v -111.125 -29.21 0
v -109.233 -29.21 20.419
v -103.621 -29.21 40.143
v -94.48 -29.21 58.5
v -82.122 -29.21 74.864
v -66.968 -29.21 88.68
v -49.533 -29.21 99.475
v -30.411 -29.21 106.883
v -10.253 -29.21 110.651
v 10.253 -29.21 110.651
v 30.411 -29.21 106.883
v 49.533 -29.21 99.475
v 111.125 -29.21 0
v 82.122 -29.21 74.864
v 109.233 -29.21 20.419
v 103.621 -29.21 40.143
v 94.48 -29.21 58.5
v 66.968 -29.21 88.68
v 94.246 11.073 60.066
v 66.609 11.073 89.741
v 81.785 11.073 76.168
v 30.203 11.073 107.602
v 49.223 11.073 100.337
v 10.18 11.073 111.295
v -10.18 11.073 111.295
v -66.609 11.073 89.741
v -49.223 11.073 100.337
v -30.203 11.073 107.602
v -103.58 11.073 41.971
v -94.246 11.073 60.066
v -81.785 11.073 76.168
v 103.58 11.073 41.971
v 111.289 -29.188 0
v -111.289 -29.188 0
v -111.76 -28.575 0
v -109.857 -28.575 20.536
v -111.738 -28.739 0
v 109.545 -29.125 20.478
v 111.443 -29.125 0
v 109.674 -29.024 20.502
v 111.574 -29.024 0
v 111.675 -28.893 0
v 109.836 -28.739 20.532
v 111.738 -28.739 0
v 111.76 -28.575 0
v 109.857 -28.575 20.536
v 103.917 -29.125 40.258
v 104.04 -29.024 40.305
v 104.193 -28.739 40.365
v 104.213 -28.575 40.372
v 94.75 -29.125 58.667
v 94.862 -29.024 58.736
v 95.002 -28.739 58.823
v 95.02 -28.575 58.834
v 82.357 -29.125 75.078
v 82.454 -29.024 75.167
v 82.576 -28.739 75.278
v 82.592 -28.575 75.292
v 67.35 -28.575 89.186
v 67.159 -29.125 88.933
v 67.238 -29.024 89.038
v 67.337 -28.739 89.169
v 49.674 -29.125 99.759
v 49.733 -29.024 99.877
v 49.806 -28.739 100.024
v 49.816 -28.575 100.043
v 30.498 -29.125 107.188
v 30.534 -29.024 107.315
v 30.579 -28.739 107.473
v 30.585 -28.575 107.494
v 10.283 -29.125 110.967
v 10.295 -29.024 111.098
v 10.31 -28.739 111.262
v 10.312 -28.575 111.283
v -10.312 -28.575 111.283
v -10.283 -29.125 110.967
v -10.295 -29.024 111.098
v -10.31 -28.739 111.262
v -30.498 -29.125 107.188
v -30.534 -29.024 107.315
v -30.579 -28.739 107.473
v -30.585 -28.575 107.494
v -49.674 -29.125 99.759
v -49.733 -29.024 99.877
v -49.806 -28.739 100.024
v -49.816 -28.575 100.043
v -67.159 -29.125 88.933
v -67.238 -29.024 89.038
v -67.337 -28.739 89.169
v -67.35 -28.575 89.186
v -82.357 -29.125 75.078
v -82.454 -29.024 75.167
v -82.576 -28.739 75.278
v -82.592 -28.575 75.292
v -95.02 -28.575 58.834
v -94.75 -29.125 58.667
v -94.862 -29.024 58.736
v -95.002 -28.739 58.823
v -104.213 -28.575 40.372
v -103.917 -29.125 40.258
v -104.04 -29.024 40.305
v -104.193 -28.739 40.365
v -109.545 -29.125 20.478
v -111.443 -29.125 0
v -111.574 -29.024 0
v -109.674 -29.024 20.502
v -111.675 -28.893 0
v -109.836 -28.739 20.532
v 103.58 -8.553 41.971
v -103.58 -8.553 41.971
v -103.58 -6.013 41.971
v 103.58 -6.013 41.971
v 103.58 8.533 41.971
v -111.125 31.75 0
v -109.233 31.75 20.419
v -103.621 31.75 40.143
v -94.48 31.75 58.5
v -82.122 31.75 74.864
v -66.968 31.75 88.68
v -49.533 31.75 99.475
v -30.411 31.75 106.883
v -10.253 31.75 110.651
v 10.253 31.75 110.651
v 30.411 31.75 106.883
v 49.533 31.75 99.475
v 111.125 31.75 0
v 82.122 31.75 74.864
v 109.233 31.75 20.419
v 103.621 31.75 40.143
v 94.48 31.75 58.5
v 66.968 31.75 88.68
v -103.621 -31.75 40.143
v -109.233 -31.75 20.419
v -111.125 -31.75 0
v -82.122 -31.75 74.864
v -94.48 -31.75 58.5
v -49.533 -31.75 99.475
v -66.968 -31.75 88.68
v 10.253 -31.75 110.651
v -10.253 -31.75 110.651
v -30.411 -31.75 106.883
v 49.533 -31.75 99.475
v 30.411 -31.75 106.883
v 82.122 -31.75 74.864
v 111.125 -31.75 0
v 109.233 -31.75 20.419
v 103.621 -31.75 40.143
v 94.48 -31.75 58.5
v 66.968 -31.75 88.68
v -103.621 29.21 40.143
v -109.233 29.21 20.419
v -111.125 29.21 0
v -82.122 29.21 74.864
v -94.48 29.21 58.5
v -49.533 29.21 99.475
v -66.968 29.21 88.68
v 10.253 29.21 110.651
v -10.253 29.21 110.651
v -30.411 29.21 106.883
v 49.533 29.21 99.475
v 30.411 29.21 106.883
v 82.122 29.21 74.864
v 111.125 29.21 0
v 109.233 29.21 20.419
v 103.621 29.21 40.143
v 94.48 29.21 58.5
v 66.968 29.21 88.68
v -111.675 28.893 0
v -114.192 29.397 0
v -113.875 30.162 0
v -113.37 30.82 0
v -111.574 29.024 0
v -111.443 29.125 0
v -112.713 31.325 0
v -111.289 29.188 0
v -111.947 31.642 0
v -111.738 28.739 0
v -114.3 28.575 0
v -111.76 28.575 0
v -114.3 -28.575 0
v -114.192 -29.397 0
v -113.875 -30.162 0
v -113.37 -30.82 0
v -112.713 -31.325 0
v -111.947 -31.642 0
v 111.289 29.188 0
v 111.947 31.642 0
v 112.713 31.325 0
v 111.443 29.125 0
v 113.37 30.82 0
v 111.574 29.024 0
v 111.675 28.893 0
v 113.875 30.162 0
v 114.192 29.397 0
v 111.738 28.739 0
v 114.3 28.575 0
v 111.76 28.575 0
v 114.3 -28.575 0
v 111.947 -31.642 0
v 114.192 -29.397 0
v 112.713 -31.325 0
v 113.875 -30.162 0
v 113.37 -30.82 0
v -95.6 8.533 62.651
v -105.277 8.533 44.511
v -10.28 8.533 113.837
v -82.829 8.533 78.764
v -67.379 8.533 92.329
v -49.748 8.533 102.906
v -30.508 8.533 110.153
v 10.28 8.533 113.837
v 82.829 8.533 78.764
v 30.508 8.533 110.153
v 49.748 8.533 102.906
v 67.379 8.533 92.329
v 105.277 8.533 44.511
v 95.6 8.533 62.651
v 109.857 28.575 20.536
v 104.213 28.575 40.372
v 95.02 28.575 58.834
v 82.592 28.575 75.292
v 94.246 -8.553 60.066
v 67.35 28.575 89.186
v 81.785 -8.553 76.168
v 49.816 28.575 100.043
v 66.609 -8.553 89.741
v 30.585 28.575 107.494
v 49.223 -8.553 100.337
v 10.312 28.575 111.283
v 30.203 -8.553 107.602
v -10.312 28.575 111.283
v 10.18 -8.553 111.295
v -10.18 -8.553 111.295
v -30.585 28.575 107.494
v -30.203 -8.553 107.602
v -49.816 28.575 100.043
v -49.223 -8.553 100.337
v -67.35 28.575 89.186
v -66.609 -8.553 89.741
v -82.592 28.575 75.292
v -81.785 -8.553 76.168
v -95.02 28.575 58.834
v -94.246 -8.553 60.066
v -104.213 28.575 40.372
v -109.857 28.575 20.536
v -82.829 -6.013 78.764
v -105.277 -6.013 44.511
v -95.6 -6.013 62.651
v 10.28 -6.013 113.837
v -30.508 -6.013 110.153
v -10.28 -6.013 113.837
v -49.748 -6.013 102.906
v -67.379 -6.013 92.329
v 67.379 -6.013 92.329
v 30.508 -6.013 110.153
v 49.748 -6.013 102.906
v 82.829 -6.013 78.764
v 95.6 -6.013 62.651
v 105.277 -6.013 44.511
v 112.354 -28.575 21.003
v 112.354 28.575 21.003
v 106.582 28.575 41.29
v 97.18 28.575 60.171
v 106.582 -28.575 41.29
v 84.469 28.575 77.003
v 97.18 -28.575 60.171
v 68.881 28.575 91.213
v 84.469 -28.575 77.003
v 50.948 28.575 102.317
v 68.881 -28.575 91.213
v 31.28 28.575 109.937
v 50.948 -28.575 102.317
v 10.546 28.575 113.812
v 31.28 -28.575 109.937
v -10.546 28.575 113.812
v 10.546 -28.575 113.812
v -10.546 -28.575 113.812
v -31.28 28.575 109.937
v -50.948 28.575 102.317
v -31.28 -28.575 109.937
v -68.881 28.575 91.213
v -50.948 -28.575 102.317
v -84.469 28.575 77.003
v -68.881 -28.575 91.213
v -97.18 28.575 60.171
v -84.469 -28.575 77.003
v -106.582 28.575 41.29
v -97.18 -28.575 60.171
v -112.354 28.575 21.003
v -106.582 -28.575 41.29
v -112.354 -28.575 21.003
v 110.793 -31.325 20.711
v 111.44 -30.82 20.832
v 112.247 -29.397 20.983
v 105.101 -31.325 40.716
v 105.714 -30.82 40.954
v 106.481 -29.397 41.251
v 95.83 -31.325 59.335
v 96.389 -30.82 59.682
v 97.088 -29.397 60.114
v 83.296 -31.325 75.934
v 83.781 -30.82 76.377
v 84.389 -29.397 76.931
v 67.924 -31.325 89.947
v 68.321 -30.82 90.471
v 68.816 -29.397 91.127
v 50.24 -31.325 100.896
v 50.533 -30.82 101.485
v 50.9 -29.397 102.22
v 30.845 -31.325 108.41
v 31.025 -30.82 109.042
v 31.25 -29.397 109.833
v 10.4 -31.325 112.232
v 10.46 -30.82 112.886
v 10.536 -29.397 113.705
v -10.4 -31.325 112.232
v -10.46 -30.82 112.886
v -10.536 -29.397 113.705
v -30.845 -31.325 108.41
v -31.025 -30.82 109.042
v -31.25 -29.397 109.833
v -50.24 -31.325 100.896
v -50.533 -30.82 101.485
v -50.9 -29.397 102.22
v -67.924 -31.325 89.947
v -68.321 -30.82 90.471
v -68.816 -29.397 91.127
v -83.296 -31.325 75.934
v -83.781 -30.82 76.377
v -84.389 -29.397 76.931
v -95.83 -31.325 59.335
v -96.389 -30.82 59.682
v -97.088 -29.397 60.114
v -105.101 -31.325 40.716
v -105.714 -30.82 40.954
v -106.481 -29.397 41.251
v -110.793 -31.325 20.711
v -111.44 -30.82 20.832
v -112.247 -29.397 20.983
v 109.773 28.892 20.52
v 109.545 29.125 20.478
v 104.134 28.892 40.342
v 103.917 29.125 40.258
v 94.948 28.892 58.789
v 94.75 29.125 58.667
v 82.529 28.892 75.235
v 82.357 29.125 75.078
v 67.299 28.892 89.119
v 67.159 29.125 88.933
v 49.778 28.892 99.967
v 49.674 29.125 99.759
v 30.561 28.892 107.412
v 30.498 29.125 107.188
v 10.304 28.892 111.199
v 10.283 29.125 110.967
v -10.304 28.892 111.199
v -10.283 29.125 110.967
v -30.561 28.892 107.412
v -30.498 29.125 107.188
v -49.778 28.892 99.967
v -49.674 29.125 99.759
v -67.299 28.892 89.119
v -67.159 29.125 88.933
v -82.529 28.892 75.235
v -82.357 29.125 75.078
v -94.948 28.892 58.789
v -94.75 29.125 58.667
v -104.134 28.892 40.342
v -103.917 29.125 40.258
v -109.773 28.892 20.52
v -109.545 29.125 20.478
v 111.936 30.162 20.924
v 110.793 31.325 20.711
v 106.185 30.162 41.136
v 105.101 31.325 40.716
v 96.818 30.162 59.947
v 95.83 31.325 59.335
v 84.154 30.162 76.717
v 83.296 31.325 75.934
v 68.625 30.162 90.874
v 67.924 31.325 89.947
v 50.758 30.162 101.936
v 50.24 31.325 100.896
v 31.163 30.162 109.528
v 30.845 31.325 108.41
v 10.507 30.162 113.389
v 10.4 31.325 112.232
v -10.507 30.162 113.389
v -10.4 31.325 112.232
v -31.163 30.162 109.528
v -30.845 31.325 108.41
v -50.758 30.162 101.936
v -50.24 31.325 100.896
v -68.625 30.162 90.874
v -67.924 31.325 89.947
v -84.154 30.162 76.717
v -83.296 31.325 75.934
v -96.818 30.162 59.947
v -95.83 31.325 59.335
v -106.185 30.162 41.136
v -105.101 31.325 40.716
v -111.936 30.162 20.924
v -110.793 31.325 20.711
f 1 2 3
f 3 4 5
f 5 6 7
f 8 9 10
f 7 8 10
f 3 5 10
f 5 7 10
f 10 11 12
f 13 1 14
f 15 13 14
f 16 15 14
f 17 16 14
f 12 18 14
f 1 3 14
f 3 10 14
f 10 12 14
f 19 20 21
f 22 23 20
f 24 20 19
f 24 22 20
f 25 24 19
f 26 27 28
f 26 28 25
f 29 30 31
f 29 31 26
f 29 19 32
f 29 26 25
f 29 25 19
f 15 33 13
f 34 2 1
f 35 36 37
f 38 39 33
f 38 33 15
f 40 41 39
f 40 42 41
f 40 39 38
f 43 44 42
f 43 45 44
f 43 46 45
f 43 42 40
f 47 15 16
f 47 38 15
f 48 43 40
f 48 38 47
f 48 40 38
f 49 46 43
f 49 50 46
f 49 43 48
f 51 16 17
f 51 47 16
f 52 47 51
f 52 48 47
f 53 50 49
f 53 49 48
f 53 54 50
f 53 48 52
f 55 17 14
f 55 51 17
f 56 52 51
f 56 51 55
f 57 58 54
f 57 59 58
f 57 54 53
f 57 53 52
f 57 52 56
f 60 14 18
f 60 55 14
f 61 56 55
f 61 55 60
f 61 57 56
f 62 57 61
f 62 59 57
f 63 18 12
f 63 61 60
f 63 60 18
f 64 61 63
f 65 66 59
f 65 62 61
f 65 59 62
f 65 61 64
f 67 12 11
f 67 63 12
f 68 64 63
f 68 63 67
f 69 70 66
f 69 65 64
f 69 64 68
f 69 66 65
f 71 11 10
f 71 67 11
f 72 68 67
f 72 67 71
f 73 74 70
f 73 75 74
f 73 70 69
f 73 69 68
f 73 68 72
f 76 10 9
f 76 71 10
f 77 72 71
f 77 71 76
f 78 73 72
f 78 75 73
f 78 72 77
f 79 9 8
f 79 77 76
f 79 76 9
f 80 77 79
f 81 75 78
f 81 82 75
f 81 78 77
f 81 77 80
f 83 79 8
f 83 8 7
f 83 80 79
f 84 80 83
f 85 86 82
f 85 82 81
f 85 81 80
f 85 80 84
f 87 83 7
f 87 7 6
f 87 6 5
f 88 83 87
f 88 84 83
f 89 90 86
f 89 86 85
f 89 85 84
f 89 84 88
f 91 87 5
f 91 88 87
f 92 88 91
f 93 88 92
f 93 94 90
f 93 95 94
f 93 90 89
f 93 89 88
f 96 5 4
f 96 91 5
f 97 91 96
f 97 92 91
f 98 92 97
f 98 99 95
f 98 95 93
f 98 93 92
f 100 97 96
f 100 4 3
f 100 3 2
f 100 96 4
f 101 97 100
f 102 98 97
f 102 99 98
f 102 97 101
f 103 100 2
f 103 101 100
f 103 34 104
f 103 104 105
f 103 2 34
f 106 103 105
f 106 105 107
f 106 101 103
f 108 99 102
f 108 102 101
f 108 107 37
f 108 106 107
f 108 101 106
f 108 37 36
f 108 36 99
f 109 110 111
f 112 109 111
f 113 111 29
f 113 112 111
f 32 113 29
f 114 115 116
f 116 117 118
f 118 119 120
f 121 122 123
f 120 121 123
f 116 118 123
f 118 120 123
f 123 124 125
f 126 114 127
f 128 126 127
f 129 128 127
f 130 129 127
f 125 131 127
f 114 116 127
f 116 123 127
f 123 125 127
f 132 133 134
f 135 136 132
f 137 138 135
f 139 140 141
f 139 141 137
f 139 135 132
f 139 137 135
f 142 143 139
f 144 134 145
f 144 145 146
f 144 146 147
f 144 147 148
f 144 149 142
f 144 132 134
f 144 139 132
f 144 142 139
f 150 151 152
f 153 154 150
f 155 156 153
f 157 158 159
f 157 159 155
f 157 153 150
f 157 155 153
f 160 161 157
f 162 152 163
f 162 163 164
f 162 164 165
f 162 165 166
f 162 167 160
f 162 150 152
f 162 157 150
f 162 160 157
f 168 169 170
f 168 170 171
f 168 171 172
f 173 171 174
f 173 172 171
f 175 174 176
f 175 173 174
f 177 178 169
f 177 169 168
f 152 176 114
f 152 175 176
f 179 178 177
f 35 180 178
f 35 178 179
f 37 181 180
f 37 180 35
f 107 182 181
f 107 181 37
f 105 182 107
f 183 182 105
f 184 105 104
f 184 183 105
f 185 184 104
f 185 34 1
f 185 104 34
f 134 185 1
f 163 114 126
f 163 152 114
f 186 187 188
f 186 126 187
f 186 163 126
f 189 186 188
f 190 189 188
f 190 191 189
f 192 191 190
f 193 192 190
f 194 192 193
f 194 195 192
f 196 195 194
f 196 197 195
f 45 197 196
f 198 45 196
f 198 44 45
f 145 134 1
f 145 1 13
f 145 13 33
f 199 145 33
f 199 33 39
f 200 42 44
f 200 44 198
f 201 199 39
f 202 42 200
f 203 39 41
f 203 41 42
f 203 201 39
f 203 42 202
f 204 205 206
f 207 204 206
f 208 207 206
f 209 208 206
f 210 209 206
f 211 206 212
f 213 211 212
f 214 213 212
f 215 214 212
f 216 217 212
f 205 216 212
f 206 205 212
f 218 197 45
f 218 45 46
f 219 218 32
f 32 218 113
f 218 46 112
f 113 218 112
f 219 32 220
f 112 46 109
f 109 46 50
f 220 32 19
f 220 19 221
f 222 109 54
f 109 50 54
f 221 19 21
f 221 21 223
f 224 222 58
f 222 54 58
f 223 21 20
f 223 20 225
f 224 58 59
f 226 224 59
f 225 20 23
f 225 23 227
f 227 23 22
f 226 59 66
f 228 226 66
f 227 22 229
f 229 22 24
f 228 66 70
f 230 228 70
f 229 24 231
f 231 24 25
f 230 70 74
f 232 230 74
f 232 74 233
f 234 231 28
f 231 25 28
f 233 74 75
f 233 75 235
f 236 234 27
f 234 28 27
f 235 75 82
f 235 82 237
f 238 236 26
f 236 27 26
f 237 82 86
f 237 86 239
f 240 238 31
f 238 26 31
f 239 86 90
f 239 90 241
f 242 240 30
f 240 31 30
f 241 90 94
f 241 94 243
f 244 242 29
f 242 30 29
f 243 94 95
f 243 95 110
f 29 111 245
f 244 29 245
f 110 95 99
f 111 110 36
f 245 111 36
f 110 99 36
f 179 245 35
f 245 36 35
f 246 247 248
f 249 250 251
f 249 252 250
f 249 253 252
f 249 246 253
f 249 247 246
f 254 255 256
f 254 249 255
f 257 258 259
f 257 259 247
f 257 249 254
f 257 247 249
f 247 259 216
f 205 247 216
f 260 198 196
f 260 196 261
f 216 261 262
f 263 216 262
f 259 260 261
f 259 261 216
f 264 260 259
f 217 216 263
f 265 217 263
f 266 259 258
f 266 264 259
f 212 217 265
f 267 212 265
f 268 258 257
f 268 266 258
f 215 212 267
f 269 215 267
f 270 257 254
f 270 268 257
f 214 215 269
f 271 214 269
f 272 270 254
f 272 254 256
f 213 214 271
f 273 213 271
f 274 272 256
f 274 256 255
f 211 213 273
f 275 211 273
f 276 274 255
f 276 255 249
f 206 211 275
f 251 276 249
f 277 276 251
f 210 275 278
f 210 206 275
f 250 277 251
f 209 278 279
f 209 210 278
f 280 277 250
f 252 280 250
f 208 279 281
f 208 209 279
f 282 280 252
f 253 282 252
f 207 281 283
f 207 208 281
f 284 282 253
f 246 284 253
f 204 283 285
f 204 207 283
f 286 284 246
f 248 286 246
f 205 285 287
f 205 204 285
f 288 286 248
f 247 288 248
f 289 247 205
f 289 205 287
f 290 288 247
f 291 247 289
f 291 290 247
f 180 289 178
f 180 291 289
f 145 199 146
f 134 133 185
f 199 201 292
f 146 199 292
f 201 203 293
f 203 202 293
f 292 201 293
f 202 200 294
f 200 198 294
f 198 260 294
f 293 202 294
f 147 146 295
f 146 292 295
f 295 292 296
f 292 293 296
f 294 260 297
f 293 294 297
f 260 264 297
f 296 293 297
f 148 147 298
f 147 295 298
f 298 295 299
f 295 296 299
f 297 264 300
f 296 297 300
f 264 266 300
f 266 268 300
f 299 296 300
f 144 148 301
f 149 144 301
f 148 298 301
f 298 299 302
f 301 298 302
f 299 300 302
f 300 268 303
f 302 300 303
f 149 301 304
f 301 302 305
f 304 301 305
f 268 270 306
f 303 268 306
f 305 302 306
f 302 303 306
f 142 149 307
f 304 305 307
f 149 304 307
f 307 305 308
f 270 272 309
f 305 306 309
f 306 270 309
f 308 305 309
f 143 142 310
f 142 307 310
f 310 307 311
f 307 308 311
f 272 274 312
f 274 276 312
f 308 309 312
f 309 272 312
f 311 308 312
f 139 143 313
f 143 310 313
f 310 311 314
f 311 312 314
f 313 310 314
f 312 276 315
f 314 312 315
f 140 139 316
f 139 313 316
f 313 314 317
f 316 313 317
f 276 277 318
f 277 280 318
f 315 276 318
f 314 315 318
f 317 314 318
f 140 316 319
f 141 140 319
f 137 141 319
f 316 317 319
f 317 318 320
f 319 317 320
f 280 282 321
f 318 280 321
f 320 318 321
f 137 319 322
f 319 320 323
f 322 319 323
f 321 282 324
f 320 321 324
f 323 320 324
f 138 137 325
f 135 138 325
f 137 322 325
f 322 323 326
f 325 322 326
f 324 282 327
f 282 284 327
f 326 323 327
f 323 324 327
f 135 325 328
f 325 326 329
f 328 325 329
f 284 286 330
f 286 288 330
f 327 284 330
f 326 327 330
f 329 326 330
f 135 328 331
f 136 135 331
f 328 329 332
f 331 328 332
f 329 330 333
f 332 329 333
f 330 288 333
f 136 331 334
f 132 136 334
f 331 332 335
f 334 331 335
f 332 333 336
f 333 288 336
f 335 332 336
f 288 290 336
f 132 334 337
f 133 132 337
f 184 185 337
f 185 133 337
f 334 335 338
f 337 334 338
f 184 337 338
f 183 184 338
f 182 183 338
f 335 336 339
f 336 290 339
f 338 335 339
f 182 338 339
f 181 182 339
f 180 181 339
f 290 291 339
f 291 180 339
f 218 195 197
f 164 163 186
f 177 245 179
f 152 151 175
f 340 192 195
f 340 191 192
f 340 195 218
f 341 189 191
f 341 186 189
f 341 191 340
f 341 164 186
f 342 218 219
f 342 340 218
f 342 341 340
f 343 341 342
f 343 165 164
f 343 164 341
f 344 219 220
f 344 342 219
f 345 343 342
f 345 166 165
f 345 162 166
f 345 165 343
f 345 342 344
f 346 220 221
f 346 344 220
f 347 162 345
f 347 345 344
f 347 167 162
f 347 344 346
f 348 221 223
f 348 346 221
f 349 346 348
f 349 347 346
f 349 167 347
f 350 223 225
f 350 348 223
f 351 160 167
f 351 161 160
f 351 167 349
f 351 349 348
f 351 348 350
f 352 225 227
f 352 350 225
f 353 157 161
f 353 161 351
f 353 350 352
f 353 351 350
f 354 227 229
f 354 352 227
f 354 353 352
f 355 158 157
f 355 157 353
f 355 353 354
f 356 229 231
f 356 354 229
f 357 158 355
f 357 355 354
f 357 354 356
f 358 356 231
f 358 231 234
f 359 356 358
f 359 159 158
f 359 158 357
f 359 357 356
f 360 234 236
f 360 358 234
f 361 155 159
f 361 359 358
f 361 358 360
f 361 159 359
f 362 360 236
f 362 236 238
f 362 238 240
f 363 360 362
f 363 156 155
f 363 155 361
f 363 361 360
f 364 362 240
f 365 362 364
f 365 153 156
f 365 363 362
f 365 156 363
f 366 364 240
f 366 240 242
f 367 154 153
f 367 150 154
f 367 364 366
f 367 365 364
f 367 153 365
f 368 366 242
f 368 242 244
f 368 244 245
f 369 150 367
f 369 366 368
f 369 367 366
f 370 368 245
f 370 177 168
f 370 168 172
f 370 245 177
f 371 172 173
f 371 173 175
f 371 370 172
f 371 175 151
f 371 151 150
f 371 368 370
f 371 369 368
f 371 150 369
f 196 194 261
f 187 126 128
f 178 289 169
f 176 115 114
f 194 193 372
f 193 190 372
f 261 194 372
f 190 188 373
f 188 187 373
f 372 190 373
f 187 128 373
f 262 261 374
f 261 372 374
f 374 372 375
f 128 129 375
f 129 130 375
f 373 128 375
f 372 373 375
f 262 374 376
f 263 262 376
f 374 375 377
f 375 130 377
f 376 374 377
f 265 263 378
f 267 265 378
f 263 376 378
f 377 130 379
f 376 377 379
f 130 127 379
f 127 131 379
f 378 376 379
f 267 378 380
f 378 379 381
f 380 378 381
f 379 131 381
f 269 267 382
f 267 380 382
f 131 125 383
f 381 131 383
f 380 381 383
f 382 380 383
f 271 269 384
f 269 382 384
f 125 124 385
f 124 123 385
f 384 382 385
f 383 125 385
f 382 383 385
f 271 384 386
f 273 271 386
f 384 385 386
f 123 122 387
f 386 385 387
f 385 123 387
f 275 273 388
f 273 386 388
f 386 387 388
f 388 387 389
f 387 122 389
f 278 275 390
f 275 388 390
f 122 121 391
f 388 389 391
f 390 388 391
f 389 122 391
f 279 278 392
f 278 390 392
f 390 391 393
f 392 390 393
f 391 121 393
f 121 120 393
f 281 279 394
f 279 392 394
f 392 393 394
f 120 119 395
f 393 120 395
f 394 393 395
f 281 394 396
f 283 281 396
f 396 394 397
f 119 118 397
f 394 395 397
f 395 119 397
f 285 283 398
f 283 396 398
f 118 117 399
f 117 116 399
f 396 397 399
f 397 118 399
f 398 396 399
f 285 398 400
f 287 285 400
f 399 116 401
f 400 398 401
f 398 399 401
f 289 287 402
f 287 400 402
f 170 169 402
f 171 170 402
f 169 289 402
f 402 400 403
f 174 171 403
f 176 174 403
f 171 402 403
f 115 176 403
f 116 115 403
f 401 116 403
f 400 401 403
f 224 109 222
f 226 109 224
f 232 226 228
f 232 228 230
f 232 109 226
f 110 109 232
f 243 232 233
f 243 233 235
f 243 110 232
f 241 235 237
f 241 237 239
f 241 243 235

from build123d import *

# Parameters (mm, degrees)
F1_DEPTH      = 31.75
F2_W          = 14.5460739732
F2_H          = 83.8538557291
F3_DEPTH      = 114.301
F3_DEPTH_BACK = 114.301
F4_R          = 3.175
F5_T          = 2.54
F5_T3_DEPTH   = 215.6340543381


# Not quite as in the source:
# - a shell that OpenCascade refuses in one call is made with other operations: the cavity is built on its own and cut out


with BuildPart() as f1:
    # F0 (on Front) → F1 (new body, symmetric)
    with BuildSketch(Plane.XZ):
        with BuildLine():
            Line((-114.3, 0), (114.3, 0))
            ThreePointArc((114.3, 0), (0, 114.3), (-114.3, 0))
        make_face()
    extrude(amount=F1_DEPTH, both=True)

    # F2 (on Right) → F3 (cut, two sides)
    with BuildSketch(Plane.YZ) as f3_sk:
        with Locations((1.2597227469, 86.4380225539)):
            Rectangle(F2_W, F2_H)
    extrude(amount=-F3_DEPTH, mode=Mode.SUBTRACT)
    extrude(f3_sk.sketch, amount=F3_DEPTH_BACK, mode=Mode.SUBTRACT)

    # F4
    f4_edges = [f1.edges().sort_by_distance(p)[0] for p in [
        (0, 31.75, 114.3),
        (0, -31.75, 114.3),
    ]]
    fillet(f4_edges, radius=F4_R)

    # F5: shell of thickness 2.54, made by hand


with BuildPart() as f5_core1:
    # F5_t2: copy of F1
    add(f1.part)

    # the walls: a layer under each face that stays
    f5_faces = [f5_core1.faces().sort_by_distance(p)[0] for p in [
        (0, 31.75, 55.5625),
        (0, 30.8200640303, 113.3700640303),
        (98.9867036526, 19.05, 57.15),
        (0, -30.8200640303, 113.3700640303),
        (0, -31.75, 55.5625),
        (0, 8.5327597335, 79.4055473447),
        (0, 1.2597227469, 44.5110946894),
        (0, -6.0133142397, 79.4055473447),
    ]]
    thicken(f5_faces, amount=-F5_T, mode=Mode.SUBTRACT)

    # F5_s4 → F5_t3 (cut)
    with BuildSketch(Plane.YZ.offset(-107.8170271691)):
        Polygon((8.5073597335, 44.5364946894), (11.0727597335, 44.5110946894), (11.0727597335, 41.9710946894), (8.5327597335, 41.9710946894), align=None)
        Polygon((-5.9879142397, 44.5364946894), (-6.0133142397, 41.9710946894), (-8.5533142397, 41.9710946894), (-8.5533142397, 44.5110946894), align=None)
    extrude(amount=F5_T3_DEPTH, mode=Mode.SUBTRACT)


with BuildPart() as f1_1:
    add(f1.part)

    # what is left inside the walls is the cavity
    f5_cavity = [f5_core1.part.solids().sort_by_distance(p)[0] for p in [
        (0, 29.1846, 37.041667),
    ]]
    add(f5_cavity, mode=Mode.SUBTRACT)


solid = f1_1.part
